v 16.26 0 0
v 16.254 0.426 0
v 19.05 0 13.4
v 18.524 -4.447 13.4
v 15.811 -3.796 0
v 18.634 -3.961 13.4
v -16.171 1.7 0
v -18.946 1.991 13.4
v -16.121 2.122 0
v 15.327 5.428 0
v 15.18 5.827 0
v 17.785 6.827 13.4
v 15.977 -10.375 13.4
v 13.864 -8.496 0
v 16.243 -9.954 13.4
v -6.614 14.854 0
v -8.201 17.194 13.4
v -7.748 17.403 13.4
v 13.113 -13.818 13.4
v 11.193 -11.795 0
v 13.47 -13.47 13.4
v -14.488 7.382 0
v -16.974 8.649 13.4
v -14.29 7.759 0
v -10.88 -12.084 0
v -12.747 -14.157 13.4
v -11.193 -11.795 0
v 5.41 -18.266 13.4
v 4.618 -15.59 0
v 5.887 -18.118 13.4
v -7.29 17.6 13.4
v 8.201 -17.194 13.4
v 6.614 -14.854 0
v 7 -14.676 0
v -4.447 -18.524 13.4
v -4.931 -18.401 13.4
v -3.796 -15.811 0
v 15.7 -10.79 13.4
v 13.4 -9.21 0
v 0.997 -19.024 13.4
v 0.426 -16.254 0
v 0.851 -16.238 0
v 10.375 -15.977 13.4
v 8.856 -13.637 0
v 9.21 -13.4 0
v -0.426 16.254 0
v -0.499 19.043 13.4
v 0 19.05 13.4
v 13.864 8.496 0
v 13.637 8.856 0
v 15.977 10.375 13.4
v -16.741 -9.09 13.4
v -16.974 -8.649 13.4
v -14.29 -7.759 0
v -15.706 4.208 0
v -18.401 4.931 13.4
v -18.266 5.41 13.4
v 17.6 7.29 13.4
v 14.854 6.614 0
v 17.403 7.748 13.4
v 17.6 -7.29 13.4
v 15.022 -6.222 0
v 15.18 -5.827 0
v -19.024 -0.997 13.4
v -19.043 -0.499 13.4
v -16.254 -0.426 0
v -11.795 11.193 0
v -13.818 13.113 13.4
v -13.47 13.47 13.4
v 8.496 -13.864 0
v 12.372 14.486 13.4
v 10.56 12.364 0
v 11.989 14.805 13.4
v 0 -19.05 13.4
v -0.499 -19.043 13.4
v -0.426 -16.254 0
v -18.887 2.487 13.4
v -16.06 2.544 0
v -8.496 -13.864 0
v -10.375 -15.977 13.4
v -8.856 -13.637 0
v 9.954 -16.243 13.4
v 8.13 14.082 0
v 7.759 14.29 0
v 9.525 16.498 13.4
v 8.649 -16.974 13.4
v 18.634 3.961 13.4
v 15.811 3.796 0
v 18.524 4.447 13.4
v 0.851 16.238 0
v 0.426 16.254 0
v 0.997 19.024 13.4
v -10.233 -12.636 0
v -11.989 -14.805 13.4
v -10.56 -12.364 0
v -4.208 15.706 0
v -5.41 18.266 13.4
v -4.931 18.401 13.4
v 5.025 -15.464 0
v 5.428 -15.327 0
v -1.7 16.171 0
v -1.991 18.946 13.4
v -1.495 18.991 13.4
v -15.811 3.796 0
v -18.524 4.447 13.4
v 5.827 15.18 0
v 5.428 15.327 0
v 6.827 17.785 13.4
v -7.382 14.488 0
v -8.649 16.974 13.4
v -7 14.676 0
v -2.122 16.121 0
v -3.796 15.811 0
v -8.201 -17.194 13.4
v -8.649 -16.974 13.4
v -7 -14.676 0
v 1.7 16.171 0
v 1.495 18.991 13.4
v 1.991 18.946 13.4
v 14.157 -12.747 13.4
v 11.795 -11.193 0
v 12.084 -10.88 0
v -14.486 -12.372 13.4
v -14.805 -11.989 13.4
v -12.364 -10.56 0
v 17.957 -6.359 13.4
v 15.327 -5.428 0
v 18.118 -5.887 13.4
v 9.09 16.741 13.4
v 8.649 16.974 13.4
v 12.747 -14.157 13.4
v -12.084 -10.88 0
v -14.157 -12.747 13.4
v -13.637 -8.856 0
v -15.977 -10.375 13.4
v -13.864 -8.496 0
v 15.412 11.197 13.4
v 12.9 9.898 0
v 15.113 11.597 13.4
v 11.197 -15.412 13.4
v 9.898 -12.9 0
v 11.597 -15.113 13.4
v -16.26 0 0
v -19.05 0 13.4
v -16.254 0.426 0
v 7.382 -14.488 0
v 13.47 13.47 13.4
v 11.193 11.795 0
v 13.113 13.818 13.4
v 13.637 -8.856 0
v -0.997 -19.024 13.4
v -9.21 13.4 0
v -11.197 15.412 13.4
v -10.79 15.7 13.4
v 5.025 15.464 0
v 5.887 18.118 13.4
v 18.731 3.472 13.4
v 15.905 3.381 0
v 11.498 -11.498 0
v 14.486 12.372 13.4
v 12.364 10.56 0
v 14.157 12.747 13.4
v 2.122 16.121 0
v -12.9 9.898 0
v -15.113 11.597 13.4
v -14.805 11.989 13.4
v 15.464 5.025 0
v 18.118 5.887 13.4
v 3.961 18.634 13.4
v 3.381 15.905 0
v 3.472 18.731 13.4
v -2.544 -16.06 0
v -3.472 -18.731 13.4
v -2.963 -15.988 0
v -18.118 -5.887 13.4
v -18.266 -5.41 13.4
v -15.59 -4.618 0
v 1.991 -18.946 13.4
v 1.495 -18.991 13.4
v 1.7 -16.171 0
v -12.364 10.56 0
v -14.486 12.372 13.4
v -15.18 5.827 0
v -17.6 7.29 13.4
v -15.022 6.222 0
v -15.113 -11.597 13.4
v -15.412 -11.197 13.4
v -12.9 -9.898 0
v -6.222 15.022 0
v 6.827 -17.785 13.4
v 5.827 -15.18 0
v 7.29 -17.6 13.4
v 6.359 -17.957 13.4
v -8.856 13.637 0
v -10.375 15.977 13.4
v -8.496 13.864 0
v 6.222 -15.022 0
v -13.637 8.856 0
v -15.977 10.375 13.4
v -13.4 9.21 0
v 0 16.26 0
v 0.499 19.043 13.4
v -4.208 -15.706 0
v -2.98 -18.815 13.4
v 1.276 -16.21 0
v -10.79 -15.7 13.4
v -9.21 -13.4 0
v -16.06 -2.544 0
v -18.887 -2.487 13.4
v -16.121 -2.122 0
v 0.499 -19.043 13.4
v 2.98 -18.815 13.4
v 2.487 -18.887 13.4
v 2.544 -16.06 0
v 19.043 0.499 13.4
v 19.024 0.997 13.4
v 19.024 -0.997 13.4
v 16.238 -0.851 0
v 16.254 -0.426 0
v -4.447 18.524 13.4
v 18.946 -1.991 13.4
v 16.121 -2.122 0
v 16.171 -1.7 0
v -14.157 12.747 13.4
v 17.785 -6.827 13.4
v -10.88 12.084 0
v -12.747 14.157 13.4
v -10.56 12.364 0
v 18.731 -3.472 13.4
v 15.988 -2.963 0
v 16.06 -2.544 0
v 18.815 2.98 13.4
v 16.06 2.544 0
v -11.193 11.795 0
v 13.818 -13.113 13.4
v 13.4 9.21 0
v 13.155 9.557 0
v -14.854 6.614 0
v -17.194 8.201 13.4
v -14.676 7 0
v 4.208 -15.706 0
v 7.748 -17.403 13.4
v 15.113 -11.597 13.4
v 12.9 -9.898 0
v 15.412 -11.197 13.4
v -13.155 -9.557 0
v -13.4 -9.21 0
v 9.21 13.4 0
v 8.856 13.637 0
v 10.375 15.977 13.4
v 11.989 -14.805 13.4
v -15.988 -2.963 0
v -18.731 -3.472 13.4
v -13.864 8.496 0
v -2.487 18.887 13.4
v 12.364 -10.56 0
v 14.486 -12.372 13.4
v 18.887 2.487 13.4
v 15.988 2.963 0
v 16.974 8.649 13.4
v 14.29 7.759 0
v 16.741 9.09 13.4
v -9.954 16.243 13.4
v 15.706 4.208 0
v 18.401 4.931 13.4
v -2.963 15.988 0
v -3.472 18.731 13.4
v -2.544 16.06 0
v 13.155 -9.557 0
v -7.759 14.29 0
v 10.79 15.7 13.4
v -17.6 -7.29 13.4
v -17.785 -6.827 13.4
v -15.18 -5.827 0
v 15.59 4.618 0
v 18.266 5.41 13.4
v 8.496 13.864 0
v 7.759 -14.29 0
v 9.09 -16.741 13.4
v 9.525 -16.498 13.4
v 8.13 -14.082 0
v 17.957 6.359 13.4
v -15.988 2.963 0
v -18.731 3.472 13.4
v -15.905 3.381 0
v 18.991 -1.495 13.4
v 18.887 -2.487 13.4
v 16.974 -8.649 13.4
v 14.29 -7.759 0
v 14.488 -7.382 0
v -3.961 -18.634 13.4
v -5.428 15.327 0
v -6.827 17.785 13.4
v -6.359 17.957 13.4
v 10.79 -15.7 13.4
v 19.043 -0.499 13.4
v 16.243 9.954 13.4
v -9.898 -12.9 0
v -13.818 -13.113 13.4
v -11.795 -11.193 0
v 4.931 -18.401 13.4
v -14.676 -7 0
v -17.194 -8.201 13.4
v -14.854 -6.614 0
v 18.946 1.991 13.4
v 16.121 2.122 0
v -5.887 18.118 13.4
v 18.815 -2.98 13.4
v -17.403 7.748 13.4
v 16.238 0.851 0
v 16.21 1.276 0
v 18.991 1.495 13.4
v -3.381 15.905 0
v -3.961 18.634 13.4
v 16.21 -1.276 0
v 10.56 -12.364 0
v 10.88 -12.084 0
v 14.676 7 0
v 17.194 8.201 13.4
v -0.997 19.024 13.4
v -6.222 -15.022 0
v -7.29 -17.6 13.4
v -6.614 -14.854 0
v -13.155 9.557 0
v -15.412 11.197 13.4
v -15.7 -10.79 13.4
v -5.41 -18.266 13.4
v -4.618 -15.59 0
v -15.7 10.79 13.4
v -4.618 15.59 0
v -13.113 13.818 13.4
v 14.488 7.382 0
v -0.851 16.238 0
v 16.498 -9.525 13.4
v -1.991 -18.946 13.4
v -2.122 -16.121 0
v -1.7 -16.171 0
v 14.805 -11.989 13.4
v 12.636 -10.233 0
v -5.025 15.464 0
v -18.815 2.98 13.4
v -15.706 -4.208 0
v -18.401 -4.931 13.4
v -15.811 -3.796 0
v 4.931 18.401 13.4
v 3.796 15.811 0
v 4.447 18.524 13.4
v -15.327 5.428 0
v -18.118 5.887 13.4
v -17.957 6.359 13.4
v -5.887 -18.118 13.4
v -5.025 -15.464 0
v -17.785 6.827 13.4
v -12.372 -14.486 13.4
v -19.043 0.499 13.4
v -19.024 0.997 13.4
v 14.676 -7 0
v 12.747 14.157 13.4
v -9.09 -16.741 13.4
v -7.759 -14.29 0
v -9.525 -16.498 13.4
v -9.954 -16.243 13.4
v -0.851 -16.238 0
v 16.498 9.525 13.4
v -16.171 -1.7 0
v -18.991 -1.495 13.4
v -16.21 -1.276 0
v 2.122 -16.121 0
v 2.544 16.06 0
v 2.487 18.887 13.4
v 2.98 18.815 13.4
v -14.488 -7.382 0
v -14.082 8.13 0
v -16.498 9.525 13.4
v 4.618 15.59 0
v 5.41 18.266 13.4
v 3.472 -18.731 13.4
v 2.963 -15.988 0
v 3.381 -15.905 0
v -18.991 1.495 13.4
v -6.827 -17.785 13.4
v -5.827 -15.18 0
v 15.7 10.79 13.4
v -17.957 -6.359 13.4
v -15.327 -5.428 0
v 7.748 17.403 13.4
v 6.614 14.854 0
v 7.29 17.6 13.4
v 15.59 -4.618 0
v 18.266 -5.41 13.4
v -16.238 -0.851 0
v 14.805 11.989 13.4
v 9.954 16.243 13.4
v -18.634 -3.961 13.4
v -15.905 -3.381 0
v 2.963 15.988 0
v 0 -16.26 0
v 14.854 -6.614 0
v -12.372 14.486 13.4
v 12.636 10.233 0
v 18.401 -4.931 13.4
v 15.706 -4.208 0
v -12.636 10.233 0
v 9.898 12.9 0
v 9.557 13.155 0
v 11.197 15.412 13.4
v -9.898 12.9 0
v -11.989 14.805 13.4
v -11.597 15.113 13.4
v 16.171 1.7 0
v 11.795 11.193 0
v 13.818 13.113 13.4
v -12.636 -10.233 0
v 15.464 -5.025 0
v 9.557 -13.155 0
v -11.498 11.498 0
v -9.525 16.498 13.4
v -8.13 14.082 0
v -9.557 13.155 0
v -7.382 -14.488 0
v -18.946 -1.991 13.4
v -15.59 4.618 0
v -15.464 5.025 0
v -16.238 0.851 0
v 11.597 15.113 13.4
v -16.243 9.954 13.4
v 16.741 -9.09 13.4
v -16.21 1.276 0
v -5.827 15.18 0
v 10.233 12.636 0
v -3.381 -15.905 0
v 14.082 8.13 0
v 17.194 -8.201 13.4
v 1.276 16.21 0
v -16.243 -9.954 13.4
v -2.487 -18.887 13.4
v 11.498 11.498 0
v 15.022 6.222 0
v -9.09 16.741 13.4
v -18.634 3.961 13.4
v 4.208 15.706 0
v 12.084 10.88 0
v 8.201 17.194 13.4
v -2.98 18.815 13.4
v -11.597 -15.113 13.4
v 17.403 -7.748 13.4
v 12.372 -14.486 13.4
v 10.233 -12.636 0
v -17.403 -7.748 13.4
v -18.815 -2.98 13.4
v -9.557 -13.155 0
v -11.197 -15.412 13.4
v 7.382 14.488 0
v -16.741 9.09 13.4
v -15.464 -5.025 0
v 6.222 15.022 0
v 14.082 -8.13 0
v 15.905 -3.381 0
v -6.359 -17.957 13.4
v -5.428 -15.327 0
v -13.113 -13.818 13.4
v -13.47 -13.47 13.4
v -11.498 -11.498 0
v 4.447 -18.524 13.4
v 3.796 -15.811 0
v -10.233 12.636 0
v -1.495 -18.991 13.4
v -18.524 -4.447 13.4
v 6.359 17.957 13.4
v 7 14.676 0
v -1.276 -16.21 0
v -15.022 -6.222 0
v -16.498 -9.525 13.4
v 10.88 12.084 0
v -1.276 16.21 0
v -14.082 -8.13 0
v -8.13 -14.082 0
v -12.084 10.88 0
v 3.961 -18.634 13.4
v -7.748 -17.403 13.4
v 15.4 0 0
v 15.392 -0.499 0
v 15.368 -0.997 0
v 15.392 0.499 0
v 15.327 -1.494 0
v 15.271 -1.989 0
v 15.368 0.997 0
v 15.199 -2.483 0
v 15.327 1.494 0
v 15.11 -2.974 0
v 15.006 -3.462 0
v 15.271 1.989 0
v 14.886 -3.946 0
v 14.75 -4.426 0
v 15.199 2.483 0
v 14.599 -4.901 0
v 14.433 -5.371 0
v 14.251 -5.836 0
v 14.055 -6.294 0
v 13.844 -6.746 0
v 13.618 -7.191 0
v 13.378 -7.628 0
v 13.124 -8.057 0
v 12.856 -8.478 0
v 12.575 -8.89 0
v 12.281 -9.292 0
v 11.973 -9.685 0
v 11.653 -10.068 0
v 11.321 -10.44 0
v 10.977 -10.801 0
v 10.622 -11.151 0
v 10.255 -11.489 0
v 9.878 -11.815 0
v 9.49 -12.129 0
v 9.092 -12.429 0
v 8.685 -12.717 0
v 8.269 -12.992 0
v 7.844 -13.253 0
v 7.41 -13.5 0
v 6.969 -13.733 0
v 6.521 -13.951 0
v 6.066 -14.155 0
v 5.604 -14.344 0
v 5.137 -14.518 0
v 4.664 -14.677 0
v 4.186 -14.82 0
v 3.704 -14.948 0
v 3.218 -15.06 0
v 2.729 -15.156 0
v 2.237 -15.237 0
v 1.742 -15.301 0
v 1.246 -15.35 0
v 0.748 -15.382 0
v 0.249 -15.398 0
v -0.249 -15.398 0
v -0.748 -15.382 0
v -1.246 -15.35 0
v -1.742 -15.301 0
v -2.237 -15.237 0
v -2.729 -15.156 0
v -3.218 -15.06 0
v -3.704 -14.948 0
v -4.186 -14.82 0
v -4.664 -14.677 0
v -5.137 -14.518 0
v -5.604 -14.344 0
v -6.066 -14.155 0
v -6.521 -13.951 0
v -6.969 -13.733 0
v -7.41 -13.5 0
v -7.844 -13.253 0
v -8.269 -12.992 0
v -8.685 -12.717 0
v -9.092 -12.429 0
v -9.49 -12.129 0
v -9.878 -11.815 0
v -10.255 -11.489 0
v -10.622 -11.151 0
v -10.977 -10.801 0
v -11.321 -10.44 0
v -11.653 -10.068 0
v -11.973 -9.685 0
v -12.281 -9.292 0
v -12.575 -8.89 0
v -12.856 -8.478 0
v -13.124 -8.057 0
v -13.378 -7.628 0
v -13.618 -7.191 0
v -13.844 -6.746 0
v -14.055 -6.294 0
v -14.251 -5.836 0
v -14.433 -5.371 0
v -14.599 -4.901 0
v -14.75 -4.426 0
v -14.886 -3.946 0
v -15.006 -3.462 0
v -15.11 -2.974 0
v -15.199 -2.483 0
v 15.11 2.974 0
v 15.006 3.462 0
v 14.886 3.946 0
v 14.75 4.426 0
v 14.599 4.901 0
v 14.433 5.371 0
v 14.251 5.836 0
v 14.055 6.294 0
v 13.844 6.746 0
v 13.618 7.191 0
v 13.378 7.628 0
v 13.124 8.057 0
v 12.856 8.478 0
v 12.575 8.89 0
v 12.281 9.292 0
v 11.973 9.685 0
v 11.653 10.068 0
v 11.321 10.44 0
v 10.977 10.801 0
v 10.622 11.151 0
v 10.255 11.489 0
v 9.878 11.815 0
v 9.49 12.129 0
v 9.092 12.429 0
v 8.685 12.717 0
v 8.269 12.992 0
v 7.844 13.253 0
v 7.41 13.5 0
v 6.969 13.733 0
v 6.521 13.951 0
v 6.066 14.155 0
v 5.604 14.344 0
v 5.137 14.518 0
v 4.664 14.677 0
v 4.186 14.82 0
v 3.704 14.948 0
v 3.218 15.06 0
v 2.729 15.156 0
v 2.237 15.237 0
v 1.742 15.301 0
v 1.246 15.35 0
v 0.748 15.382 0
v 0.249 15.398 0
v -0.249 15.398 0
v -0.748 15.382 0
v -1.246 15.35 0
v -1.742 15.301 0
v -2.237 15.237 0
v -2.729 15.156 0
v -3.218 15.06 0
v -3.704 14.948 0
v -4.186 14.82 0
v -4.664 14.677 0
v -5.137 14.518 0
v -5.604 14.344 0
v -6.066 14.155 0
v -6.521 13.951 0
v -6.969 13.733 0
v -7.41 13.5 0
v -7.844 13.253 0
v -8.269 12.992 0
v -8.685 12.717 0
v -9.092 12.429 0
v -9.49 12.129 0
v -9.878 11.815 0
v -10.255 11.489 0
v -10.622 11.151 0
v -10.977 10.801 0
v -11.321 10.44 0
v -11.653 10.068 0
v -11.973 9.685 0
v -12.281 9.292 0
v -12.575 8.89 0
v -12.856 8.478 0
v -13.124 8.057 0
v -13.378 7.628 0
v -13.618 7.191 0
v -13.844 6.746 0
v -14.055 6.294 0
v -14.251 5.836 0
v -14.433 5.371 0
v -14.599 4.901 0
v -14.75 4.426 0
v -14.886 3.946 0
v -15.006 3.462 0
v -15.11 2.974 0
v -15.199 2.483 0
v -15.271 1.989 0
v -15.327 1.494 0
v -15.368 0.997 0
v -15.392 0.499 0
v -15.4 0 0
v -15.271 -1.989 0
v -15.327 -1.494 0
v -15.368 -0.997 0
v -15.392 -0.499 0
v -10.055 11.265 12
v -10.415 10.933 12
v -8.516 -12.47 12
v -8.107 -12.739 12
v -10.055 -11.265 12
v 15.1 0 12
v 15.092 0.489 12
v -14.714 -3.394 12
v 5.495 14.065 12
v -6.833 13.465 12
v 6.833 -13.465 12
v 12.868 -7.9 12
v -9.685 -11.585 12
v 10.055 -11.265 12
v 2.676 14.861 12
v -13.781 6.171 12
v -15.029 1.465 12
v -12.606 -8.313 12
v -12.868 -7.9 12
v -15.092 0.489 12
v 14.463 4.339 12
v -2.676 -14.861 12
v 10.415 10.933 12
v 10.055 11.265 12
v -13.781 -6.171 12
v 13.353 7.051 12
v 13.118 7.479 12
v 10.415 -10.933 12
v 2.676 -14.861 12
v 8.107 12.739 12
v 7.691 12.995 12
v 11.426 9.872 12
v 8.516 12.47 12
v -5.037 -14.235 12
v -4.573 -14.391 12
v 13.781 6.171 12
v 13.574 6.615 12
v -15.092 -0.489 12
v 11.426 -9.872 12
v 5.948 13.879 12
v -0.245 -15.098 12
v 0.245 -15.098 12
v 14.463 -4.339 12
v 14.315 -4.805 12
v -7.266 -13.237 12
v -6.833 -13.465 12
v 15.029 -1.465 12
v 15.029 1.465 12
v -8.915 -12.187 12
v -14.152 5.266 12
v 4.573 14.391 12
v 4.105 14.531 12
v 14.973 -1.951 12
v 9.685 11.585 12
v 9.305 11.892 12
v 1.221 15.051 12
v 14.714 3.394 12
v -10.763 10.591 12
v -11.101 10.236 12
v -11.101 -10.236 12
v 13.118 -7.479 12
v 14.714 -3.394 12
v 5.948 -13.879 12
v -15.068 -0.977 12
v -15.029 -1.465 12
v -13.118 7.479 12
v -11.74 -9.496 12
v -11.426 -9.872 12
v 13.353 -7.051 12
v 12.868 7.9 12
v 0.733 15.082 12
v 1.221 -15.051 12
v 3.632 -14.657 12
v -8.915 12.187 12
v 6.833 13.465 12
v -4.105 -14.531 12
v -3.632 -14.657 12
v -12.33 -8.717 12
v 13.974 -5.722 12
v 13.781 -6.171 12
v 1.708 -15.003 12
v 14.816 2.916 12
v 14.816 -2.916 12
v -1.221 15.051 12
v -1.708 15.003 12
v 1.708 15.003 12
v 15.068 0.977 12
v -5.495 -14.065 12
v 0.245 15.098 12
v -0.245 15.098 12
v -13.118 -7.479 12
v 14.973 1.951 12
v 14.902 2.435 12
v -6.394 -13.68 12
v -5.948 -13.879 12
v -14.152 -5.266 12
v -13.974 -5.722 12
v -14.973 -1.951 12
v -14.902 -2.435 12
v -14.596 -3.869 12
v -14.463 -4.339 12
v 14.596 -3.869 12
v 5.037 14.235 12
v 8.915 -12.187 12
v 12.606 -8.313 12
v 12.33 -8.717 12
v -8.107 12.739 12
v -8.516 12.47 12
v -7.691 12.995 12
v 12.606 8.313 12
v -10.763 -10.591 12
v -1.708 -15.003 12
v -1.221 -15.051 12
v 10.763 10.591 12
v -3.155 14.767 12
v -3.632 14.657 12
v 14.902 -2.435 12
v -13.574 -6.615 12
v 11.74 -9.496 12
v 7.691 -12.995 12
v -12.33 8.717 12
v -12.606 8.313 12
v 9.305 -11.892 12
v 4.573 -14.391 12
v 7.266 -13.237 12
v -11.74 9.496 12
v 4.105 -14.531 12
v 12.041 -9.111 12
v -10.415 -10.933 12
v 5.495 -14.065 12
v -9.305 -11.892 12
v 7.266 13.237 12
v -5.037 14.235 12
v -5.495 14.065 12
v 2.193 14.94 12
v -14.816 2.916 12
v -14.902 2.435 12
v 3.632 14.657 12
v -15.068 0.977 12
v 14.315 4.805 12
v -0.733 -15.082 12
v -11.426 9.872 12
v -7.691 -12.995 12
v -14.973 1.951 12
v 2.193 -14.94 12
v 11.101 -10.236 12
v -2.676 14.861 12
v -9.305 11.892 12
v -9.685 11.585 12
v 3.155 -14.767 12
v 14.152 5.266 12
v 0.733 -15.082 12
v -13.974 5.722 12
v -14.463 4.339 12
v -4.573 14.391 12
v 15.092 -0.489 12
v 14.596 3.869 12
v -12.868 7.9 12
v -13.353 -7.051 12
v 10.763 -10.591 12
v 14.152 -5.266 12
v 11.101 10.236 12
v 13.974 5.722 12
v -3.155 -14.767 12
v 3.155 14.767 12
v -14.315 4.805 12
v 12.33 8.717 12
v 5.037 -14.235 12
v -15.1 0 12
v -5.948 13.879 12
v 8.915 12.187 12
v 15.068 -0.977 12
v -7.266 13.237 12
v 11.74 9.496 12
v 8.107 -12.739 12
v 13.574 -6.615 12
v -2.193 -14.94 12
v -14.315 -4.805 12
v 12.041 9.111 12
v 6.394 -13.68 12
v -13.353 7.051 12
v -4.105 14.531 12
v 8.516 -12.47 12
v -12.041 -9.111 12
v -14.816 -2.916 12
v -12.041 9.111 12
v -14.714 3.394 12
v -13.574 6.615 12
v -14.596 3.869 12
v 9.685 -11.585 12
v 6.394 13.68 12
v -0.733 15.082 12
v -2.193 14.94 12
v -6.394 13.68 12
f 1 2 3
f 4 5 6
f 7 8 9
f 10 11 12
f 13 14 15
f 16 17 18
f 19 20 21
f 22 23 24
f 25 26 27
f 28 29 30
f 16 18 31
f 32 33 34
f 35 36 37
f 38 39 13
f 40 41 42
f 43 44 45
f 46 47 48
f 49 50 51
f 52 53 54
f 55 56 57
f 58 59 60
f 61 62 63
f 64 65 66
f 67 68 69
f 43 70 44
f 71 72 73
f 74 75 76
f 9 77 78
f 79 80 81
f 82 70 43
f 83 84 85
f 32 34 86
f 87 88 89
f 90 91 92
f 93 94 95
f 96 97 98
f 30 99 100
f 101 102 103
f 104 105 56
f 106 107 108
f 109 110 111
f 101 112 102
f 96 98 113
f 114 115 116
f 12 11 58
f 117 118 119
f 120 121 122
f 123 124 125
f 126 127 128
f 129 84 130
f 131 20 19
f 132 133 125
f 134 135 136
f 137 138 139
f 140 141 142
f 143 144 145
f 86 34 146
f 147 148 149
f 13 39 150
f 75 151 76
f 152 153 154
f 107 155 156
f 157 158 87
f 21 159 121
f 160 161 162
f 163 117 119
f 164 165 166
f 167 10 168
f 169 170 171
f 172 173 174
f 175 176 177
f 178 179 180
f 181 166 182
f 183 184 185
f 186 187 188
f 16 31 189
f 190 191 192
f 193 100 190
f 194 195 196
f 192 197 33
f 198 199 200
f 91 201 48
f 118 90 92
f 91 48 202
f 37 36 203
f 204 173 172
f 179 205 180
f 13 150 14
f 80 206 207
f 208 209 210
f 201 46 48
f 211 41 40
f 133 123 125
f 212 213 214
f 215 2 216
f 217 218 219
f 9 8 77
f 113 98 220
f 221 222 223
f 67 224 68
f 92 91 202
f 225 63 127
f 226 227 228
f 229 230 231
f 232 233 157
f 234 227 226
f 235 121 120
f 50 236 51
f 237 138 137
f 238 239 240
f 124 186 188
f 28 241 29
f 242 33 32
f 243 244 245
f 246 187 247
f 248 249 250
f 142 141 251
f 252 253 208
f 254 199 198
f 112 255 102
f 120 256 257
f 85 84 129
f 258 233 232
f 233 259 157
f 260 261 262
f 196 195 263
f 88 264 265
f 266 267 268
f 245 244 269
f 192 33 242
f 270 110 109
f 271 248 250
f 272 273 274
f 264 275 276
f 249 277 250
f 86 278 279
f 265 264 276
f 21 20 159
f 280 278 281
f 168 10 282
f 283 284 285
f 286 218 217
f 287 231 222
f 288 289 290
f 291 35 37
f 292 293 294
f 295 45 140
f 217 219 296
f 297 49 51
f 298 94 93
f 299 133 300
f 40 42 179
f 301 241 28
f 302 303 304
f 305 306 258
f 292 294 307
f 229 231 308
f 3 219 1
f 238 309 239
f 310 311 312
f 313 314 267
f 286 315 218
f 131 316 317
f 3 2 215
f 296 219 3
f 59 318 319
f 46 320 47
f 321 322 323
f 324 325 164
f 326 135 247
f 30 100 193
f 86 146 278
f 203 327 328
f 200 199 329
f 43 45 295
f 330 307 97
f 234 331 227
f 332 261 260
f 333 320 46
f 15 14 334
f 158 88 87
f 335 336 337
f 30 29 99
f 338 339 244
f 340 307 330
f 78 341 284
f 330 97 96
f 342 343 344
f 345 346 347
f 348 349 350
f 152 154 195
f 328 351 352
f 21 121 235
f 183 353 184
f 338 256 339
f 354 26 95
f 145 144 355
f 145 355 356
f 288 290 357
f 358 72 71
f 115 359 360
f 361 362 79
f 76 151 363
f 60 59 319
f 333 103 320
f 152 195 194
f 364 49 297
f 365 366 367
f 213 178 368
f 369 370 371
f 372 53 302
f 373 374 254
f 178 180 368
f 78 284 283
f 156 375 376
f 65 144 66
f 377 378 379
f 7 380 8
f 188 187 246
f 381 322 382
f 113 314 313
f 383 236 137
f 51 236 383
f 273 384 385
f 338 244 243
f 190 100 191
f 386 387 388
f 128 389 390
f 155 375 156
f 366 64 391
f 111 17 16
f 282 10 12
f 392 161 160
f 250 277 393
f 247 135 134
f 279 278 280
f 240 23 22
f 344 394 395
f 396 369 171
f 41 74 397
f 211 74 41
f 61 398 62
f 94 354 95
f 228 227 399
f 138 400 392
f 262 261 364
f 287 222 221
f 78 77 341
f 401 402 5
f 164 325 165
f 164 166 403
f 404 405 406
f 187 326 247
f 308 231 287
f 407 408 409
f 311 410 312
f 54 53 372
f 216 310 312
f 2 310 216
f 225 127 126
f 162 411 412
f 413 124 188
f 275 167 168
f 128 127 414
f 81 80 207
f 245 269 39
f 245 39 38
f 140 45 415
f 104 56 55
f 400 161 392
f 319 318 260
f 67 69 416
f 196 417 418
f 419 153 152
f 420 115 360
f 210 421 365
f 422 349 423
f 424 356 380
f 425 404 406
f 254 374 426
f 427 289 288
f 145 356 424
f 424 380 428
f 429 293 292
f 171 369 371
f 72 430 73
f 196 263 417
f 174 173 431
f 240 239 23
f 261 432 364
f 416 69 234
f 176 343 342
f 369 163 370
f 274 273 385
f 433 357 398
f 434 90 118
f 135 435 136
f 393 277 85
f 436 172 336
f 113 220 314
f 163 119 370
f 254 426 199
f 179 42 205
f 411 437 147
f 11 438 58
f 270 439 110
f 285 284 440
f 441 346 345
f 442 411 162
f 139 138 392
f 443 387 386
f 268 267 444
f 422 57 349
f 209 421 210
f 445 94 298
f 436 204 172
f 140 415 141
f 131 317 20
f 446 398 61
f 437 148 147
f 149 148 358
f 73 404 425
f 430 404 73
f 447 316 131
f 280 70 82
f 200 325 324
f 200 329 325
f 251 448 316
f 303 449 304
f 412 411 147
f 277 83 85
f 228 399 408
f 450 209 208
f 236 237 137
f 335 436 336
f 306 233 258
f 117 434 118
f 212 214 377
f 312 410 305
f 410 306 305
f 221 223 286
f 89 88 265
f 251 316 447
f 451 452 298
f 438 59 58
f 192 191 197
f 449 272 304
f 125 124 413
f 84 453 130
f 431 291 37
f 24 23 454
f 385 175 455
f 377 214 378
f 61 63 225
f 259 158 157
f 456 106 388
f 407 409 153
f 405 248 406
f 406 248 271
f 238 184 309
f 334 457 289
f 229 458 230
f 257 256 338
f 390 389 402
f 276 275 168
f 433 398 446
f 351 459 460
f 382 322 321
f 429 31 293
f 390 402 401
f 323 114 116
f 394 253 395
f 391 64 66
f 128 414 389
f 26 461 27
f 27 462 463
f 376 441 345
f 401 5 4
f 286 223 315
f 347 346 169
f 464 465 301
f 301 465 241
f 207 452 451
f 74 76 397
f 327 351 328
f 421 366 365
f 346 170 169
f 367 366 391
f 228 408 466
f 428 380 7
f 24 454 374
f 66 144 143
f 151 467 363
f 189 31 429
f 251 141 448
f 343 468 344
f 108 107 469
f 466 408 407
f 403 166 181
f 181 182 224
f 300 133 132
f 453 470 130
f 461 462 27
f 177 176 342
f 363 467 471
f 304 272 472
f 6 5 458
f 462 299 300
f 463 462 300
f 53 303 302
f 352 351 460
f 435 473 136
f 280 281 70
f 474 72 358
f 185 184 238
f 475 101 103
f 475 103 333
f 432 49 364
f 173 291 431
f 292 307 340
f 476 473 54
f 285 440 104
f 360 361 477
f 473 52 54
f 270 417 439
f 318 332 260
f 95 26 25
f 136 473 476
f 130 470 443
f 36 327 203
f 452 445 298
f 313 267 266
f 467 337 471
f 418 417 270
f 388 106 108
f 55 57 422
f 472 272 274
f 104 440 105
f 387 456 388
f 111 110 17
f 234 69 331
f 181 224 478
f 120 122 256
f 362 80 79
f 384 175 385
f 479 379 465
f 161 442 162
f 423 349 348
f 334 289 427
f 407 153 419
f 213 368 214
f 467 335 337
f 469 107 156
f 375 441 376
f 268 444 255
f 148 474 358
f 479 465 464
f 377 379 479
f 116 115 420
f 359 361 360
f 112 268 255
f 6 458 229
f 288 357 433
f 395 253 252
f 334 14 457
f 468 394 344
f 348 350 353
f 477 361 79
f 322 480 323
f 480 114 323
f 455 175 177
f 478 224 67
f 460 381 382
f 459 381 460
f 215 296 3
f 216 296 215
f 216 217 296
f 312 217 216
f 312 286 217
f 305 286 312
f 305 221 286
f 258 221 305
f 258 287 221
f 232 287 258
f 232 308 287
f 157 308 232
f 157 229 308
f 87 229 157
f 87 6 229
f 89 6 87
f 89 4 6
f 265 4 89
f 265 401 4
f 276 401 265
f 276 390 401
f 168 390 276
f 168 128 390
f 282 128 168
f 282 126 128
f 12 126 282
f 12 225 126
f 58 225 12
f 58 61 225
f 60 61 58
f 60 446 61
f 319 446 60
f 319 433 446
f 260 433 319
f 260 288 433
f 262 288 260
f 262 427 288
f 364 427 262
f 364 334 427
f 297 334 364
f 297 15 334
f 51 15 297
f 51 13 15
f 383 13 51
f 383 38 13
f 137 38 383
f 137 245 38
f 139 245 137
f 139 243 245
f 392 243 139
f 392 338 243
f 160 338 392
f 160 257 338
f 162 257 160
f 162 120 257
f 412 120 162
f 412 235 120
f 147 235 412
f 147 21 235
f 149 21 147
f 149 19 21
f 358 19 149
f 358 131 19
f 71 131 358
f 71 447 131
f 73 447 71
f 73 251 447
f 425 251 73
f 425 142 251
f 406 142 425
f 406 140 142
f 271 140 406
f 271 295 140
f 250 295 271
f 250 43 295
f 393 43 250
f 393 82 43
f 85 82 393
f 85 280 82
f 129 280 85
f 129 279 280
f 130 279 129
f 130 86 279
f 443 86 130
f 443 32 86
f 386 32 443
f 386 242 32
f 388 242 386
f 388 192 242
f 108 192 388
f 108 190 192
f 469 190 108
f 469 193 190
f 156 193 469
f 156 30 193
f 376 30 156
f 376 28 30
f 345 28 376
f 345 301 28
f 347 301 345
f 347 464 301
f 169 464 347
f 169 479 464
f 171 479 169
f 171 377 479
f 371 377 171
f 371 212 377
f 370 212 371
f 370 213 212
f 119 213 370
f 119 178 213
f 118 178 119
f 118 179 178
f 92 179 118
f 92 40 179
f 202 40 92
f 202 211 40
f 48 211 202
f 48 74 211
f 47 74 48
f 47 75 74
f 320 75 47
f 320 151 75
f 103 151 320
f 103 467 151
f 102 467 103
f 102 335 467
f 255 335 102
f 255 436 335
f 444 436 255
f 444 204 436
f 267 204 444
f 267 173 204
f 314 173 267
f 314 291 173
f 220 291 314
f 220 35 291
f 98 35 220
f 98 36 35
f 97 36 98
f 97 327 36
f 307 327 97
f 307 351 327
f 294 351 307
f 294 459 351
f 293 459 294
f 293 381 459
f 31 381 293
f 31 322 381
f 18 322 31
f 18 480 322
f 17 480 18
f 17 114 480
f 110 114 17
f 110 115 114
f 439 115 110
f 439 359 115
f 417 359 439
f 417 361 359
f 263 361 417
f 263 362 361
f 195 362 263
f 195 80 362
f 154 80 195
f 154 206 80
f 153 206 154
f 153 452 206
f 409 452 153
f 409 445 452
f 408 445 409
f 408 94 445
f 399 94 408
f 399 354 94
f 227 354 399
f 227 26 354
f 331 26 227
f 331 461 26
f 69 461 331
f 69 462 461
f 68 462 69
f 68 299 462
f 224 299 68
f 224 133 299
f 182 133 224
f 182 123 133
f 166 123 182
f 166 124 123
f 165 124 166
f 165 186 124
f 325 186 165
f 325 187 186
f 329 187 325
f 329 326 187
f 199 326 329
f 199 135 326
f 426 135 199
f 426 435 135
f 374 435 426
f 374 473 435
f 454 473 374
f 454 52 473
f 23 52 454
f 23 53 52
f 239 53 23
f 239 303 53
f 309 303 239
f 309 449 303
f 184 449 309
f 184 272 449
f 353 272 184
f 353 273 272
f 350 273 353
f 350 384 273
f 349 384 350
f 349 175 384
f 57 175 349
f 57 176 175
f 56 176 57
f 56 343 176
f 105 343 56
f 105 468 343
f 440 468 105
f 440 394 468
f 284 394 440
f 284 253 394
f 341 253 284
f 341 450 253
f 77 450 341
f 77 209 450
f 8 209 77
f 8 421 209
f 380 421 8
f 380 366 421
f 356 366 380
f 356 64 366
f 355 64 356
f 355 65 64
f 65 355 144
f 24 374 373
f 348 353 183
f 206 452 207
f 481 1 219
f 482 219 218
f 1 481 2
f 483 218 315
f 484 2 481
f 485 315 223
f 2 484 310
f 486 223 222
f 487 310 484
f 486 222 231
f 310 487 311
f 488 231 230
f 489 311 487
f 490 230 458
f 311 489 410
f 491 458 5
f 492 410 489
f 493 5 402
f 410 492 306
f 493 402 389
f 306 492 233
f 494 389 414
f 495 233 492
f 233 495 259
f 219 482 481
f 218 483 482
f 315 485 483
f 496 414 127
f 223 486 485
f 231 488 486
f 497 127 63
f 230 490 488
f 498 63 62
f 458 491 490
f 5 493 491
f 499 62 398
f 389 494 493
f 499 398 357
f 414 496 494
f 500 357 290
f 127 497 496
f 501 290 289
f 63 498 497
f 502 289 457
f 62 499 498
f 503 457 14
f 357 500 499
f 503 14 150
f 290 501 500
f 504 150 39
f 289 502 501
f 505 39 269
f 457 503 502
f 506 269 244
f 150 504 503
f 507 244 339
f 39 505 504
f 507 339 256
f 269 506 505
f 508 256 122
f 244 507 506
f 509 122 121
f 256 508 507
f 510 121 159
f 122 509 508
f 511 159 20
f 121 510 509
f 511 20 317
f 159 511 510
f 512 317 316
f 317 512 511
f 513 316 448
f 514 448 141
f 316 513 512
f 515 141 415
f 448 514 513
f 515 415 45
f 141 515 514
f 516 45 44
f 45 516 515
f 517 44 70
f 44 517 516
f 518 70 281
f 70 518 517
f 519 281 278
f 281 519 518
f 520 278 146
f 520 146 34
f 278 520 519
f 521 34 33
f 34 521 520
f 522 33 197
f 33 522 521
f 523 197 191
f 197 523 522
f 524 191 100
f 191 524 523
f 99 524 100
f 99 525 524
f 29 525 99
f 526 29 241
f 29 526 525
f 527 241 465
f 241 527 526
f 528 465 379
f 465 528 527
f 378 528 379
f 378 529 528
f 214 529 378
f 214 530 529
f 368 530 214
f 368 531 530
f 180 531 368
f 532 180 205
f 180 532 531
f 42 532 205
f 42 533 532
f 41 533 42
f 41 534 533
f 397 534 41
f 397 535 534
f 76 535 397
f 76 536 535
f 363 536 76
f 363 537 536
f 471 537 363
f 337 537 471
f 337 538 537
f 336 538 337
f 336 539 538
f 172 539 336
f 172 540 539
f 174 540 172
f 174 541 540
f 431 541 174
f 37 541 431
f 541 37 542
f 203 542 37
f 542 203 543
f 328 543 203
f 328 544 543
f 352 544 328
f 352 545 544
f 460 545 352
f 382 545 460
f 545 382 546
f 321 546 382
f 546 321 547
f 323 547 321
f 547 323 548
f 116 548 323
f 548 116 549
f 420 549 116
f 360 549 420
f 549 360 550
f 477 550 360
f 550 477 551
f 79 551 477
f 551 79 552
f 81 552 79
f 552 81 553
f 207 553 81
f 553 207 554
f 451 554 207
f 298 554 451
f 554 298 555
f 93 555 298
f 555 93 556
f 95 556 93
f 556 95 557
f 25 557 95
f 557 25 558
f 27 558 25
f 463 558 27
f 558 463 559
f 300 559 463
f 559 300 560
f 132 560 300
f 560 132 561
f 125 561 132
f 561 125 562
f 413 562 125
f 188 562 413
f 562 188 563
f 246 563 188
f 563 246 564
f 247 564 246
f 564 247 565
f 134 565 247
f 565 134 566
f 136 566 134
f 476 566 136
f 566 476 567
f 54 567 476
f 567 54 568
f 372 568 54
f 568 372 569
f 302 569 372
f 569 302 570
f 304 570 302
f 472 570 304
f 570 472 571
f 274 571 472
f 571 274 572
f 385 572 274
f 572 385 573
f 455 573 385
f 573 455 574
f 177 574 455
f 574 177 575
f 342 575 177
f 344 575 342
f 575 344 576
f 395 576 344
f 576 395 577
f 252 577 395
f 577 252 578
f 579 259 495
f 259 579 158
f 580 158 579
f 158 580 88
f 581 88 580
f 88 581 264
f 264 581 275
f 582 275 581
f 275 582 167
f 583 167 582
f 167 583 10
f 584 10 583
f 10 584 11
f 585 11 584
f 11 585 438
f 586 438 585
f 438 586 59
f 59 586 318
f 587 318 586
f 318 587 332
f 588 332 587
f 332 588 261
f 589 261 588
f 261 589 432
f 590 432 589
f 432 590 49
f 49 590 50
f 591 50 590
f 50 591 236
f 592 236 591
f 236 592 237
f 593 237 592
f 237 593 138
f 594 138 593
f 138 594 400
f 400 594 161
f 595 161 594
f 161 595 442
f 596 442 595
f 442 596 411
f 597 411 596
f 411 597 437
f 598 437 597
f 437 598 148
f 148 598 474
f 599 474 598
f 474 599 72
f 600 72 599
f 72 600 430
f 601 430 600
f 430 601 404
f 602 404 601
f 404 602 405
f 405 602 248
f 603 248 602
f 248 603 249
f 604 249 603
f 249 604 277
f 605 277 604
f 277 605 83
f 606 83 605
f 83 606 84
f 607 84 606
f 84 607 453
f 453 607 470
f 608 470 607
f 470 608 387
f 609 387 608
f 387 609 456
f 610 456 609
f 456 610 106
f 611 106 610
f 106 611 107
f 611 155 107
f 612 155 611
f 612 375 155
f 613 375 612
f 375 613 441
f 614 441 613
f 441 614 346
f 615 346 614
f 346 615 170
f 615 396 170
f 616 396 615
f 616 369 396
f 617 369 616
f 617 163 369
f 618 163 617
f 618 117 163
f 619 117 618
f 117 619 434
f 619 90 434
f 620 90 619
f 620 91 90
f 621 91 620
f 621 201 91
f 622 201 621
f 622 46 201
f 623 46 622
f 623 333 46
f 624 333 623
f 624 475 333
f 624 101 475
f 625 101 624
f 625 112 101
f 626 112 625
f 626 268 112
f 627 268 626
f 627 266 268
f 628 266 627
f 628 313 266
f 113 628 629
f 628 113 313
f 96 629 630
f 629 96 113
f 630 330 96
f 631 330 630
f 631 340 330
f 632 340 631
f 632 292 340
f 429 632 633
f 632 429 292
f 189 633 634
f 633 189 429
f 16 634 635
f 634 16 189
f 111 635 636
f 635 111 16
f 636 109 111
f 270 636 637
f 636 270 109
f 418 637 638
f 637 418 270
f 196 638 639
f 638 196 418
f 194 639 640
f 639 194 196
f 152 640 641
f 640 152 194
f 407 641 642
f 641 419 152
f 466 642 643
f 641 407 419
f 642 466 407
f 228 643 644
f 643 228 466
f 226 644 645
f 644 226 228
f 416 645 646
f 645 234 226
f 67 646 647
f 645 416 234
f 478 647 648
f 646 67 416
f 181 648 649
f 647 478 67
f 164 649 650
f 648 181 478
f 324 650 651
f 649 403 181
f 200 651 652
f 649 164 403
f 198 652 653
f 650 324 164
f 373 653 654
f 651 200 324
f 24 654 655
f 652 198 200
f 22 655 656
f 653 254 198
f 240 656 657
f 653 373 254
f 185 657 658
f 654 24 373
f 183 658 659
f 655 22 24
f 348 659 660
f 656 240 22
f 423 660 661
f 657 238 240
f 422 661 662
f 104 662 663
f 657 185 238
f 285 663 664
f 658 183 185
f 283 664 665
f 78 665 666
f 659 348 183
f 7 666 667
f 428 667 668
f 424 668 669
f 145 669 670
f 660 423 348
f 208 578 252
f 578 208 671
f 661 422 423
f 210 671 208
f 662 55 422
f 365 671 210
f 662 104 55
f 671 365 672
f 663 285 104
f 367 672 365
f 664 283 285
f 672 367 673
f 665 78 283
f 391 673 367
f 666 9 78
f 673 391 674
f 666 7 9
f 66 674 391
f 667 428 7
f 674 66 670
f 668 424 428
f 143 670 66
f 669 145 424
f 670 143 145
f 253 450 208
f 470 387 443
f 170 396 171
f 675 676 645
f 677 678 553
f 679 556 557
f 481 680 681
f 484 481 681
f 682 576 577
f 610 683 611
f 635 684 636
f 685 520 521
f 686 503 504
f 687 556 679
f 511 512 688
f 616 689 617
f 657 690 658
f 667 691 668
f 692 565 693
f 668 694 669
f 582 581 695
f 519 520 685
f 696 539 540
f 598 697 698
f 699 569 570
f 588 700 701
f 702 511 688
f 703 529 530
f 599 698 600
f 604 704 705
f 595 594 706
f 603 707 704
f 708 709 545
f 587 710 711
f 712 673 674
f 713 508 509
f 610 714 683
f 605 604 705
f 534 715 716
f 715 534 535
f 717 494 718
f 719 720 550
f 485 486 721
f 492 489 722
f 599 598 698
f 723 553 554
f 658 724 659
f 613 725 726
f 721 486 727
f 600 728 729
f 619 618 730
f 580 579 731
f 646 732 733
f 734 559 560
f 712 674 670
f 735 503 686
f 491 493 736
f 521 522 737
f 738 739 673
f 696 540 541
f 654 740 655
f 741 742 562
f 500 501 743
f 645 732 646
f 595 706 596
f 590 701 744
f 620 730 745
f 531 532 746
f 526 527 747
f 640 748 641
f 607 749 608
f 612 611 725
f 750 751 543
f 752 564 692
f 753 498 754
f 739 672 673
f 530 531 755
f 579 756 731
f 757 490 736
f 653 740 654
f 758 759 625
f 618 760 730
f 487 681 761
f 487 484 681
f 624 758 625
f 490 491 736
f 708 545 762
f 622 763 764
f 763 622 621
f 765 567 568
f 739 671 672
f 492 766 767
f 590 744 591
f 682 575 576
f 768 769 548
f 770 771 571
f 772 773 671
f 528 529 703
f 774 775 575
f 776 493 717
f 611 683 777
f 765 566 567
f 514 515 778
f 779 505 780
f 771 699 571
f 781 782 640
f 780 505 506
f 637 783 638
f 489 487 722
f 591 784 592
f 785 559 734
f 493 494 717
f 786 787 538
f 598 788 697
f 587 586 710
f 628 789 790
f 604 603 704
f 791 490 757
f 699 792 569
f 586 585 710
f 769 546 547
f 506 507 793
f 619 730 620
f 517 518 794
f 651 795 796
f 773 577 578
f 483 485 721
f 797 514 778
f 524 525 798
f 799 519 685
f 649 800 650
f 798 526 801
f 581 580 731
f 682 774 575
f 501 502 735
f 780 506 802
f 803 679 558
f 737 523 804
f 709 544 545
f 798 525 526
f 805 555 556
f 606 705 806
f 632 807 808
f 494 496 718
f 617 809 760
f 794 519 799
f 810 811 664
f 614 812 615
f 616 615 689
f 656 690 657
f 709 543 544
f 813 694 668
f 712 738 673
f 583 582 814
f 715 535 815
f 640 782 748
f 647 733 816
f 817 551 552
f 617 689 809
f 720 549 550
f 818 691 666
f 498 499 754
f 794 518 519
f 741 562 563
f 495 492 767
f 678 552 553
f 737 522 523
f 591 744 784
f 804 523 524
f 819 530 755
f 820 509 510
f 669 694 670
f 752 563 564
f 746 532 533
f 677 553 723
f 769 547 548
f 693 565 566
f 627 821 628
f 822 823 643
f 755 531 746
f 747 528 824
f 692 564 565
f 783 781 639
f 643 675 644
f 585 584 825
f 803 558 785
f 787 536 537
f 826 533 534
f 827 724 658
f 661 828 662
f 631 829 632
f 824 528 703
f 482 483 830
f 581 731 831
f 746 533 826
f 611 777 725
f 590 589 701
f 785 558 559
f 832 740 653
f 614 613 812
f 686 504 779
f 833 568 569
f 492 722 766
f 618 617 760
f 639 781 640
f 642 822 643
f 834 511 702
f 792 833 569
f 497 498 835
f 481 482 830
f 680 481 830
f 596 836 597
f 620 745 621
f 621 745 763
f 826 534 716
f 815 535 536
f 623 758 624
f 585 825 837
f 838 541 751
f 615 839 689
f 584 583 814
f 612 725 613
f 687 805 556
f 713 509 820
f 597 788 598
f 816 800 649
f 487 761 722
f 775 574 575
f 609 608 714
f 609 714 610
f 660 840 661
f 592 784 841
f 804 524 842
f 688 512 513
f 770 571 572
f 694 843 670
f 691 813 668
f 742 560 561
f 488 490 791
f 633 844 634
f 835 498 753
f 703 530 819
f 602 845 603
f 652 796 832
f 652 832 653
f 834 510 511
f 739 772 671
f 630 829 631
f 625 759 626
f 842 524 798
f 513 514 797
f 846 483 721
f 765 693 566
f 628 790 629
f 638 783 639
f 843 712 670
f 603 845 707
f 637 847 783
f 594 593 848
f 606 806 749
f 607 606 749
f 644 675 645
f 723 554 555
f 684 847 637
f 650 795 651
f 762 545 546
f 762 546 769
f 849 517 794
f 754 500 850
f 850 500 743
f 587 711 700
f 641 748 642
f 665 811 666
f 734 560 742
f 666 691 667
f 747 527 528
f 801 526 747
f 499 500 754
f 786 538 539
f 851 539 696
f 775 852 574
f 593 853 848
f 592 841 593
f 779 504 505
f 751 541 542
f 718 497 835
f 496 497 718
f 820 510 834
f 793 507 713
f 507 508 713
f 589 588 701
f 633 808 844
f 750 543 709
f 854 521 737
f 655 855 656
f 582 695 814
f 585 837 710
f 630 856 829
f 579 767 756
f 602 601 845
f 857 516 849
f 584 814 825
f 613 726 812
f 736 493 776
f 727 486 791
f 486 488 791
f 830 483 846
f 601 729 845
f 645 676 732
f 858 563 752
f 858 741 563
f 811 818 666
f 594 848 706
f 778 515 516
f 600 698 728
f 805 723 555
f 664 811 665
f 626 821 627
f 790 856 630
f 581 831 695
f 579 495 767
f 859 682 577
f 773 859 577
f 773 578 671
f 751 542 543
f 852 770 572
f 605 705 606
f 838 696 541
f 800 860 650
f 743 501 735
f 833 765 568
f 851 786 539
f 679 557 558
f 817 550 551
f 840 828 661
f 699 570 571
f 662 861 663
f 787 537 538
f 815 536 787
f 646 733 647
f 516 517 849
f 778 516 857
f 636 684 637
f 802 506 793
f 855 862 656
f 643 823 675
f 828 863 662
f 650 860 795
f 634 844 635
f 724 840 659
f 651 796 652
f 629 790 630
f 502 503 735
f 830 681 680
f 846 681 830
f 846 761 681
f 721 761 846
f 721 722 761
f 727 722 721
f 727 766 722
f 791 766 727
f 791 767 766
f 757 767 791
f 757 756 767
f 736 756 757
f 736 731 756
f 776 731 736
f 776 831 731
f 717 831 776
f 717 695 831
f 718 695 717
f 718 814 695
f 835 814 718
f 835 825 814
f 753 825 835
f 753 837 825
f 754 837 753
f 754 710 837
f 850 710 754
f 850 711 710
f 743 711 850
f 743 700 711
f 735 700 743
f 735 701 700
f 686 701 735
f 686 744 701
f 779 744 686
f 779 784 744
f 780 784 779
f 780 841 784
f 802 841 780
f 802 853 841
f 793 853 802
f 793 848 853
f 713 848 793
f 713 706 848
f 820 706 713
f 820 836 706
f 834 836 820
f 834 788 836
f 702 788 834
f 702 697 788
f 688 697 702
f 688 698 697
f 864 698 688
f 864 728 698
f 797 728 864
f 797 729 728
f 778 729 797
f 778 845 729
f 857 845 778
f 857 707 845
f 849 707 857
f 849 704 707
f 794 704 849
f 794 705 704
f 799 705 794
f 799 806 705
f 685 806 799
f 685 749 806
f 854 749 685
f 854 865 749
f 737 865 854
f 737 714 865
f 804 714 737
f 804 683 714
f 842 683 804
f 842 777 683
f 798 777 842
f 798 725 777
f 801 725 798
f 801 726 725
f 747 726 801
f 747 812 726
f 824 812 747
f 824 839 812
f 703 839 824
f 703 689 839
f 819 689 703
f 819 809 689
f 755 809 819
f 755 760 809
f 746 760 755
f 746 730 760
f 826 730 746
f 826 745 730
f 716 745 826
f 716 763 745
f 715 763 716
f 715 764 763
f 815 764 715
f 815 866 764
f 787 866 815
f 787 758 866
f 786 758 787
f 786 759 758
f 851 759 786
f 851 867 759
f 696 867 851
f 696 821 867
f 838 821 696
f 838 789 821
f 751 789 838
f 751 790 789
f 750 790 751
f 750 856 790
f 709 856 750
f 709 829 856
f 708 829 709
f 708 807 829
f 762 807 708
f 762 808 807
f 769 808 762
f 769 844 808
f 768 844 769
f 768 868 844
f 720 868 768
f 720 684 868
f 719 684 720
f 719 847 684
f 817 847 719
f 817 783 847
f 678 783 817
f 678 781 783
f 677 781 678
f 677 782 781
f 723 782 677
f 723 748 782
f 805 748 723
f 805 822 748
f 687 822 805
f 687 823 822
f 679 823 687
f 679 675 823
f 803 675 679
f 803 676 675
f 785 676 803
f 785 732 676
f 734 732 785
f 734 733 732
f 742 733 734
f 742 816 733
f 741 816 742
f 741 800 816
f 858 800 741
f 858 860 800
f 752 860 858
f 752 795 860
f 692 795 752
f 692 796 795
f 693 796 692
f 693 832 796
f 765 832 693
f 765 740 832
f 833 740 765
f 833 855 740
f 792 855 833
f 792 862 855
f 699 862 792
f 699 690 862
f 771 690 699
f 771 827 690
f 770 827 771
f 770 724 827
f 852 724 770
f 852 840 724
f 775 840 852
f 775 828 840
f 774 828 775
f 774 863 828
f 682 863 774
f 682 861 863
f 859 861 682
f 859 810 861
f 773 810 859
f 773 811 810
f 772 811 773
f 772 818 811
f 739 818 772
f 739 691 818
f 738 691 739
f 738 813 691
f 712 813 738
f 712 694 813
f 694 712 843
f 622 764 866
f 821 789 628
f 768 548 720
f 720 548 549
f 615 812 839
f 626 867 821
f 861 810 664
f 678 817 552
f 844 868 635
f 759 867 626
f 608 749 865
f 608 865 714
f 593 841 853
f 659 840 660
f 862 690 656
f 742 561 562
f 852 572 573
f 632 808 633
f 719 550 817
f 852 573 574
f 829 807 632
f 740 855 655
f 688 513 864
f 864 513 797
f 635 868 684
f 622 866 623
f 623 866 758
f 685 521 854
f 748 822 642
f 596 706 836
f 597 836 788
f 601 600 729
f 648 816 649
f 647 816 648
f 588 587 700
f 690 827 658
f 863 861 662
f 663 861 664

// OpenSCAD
$fa = .01;
$fs = $preview ? 2 : .5;
h=12;
d2=$preview ? 15 : 30.0+.2;
d1=30.6+.2;
twt=.86;
inch=25.4*1.5;
difference(){
    cylinder(h=h+7*.2,d1=d1+twt*2,d2=inch);
    cylinder(h=h,d1=d1,d2=d2);
}
